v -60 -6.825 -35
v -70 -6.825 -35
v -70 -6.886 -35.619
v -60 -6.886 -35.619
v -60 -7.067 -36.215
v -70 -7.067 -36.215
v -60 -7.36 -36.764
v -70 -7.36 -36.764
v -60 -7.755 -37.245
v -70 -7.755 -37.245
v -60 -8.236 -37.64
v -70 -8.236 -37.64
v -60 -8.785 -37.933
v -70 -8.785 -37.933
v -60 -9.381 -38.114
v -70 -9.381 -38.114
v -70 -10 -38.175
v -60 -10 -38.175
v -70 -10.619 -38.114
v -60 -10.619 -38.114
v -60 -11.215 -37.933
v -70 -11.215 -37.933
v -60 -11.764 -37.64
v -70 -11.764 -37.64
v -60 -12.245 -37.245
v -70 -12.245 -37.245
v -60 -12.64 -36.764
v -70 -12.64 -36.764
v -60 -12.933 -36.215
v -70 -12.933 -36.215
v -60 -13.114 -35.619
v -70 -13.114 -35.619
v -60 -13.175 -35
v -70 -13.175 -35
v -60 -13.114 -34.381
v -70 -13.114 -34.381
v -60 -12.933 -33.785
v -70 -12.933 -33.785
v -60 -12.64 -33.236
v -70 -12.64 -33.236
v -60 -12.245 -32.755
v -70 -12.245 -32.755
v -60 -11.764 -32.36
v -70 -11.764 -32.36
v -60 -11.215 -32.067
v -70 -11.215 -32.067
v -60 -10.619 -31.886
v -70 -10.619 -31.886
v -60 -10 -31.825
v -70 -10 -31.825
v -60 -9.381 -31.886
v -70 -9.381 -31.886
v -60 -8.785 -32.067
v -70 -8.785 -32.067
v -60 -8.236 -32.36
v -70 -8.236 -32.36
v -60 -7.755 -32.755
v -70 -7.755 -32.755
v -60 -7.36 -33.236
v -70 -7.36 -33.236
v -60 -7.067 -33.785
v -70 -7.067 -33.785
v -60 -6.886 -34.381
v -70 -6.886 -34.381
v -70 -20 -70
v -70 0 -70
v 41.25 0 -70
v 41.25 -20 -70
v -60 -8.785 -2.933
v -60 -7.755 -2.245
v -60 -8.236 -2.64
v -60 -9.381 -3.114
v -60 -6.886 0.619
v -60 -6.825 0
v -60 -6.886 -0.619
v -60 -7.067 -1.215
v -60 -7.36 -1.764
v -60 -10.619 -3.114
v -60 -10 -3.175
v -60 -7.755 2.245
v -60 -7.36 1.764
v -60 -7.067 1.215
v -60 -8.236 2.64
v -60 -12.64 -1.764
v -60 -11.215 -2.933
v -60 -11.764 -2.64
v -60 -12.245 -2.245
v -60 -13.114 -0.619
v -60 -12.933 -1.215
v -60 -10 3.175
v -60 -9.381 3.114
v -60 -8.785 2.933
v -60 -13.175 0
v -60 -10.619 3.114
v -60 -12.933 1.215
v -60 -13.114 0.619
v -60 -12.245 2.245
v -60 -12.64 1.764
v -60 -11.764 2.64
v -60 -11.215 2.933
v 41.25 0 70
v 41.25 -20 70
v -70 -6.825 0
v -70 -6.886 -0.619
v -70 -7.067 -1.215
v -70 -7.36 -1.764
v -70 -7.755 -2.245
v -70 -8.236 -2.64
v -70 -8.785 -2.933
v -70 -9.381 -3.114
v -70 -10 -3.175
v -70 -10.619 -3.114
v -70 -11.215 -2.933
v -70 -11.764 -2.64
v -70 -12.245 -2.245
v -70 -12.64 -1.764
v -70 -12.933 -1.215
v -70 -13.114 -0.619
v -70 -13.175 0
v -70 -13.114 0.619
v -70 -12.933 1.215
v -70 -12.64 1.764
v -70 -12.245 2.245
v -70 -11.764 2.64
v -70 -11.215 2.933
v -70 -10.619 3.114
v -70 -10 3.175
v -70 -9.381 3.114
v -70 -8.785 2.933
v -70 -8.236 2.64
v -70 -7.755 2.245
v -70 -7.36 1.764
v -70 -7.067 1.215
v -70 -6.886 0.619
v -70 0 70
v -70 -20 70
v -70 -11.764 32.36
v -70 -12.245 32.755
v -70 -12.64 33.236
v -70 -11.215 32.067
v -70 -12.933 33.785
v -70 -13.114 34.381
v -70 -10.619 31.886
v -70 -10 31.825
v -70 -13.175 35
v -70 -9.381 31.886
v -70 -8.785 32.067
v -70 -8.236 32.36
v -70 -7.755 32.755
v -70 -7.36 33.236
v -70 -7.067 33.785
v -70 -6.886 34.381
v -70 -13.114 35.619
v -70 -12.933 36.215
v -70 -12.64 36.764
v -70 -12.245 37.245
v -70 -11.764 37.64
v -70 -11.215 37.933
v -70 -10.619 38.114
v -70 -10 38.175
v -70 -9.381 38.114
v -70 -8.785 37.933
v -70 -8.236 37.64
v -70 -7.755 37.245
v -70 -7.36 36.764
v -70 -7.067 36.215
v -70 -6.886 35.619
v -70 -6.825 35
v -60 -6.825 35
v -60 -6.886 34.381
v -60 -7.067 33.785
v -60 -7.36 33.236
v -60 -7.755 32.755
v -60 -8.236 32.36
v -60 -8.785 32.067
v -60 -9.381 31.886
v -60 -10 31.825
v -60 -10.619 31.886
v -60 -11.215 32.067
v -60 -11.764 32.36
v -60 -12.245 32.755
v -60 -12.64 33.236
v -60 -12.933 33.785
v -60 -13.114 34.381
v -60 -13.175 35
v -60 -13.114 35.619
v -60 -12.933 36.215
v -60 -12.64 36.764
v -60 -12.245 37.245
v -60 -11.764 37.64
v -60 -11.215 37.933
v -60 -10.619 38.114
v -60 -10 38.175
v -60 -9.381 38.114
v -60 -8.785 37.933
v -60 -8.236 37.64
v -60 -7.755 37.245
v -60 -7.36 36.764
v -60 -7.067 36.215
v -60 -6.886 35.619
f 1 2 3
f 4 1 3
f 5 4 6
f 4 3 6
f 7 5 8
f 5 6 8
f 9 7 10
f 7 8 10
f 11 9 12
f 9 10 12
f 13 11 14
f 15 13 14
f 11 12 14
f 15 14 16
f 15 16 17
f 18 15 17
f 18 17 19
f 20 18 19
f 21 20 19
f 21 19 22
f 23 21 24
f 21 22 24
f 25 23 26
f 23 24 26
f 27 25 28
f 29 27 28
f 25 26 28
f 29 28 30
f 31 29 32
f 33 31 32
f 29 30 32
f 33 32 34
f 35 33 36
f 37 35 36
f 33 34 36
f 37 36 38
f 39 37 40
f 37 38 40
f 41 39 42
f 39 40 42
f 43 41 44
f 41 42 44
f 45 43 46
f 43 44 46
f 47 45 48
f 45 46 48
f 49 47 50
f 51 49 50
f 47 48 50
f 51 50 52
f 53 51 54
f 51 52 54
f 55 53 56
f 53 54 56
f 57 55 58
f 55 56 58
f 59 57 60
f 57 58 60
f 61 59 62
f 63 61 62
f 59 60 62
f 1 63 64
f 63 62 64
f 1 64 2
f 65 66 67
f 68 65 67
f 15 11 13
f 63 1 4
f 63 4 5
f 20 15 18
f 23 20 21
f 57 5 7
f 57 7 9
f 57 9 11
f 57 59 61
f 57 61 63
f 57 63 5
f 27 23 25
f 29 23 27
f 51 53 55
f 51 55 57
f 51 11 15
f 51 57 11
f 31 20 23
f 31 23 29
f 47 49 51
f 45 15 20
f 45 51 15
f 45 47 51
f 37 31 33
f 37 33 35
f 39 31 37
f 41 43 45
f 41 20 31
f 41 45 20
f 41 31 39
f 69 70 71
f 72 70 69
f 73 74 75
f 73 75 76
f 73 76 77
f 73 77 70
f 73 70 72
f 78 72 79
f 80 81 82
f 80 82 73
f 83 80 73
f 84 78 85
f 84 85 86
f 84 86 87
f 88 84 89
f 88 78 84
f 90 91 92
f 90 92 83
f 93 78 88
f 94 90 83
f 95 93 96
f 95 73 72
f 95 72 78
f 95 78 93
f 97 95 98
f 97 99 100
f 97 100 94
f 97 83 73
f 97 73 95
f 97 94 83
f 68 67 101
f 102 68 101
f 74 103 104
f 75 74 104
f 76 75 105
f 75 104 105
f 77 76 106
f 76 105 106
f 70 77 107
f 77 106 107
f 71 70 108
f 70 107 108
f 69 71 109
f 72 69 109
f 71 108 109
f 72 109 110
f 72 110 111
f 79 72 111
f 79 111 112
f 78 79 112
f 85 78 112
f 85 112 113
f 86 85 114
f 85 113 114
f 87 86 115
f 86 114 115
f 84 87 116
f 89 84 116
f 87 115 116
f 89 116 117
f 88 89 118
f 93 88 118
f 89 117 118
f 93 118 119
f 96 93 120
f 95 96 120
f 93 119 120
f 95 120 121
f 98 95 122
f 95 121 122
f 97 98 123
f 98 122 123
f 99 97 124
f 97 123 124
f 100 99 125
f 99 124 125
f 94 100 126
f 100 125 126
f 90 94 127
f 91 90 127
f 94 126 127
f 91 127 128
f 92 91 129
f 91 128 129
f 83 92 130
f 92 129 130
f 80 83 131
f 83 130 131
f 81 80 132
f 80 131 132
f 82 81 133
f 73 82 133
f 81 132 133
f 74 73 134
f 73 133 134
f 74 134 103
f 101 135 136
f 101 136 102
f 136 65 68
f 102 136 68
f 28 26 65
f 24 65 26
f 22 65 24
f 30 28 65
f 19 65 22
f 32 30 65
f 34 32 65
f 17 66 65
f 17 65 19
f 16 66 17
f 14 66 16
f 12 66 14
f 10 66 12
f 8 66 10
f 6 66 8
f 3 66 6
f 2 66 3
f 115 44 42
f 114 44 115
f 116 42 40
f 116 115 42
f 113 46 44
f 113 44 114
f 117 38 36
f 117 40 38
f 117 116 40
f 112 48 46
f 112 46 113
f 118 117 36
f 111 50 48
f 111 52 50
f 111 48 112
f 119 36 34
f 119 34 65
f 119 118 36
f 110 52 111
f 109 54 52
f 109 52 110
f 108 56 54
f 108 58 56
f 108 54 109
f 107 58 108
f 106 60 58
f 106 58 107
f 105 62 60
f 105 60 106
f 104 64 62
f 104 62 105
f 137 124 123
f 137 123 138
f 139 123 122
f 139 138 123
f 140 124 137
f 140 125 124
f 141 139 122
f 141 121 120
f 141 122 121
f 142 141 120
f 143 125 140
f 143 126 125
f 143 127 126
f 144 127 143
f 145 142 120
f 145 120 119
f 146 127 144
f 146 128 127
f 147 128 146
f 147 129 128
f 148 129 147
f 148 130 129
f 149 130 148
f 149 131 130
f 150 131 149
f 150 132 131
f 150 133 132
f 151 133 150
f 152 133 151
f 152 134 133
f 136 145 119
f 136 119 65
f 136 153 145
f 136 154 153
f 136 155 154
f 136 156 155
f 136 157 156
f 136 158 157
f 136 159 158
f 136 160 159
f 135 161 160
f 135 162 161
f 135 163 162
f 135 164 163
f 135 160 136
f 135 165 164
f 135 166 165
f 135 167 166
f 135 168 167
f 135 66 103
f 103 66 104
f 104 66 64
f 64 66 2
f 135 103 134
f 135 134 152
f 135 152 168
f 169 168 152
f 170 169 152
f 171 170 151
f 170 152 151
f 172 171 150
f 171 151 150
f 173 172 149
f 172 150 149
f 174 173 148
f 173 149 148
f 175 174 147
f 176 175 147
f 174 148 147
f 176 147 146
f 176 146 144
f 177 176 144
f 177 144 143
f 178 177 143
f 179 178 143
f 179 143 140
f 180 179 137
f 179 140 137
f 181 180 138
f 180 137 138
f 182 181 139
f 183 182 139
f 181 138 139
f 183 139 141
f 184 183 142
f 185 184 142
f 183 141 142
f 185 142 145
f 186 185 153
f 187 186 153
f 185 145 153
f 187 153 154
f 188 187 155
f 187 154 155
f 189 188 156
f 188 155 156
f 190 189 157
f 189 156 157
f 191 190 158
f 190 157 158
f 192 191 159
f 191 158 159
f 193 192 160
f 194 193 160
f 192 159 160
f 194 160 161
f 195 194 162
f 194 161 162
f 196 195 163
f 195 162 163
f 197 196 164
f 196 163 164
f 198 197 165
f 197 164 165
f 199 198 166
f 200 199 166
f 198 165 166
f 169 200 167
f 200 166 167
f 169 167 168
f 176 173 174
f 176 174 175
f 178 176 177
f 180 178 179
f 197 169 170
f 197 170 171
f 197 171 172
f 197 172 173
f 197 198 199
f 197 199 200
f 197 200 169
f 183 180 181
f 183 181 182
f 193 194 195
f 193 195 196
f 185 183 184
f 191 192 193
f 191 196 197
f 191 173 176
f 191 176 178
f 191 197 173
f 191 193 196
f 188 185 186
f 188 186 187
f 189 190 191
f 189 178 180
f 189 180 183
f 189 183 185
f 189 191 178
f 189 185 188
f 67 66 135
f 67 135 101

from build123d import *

# Parameters (mm, degrees)
F0_W     = 140
F0_H     = 140
F1_DEPTH = 20
F3_DEPTH = 10
F4_DEPTH = 28.75


with BuildPart() as f1:
    # F0 (on Front) → F1 (new body)
    with BuildSketch(Plane.XZ):
        Rectangle(F0_W, F0_H)
    extrude(amount=F1_DEPTH)

    # F2 (on face) → F3 (cut)
    with BuildSketch(Plane(origin=(-70, 0, 0), x_dir=(0, -1, 0), z_dir=(-1, 0, 0))):
        with BuildLine():
            Line((6.825, 35.0000062), (13.175, 35.0000062))
            ThreePointArc((13.175, 35.0000062), (10, 38.1750062), (6.825, 35.0000062))
        make_face()
        with BuildLine():
            ThreePointArc((6.825, 35.0000062), (10, 31.8250062), (13.175, 35.0000062))
            Line((13.175, 35.0000062), (6.825, 35.0000062))
        make_face()
        with BuildLine():
            Line((6.825, 0), (13.175, 0))
            ThreePointArc((13.175, 0), (10, 3.175), (6.825, 0))
        make_face()
        with BuildLine():
            ThreePointArc((6.825, 0), (10, -3.175), (13.175, 0))
            Line((13.175, 0), (6.825, 0))
        make_face()
        with BuildLine():
            Line((6.825, -35.0000062), (13.175, -35.0000062))
            ThreePointArc((13.175, -35.0000062), (10, -31.8250062), (6.825, -35.0000062))
        make_face()
        with BuildLine():
            ThreePointArc((6.825, -35.0000062), (10, -38.1750062), (13.175, -35.0000062))
            Line((13.175, -35.0000062), (6.825, -35.0000062))
        make_face()
    extrude(amount=-F3_DEPTH, mode=Mode.SUBTRACT)

    # F4 (cut): a face of the model
    f4_faces = [f1.faces().sort_by_distance(p)[0] for p in [
        (70, -10, 0),
    ]]
    extrude(f4_faces, amount=-F4_DEPTH, mode=Mode.SUBTRACT)


solid = f1.part
